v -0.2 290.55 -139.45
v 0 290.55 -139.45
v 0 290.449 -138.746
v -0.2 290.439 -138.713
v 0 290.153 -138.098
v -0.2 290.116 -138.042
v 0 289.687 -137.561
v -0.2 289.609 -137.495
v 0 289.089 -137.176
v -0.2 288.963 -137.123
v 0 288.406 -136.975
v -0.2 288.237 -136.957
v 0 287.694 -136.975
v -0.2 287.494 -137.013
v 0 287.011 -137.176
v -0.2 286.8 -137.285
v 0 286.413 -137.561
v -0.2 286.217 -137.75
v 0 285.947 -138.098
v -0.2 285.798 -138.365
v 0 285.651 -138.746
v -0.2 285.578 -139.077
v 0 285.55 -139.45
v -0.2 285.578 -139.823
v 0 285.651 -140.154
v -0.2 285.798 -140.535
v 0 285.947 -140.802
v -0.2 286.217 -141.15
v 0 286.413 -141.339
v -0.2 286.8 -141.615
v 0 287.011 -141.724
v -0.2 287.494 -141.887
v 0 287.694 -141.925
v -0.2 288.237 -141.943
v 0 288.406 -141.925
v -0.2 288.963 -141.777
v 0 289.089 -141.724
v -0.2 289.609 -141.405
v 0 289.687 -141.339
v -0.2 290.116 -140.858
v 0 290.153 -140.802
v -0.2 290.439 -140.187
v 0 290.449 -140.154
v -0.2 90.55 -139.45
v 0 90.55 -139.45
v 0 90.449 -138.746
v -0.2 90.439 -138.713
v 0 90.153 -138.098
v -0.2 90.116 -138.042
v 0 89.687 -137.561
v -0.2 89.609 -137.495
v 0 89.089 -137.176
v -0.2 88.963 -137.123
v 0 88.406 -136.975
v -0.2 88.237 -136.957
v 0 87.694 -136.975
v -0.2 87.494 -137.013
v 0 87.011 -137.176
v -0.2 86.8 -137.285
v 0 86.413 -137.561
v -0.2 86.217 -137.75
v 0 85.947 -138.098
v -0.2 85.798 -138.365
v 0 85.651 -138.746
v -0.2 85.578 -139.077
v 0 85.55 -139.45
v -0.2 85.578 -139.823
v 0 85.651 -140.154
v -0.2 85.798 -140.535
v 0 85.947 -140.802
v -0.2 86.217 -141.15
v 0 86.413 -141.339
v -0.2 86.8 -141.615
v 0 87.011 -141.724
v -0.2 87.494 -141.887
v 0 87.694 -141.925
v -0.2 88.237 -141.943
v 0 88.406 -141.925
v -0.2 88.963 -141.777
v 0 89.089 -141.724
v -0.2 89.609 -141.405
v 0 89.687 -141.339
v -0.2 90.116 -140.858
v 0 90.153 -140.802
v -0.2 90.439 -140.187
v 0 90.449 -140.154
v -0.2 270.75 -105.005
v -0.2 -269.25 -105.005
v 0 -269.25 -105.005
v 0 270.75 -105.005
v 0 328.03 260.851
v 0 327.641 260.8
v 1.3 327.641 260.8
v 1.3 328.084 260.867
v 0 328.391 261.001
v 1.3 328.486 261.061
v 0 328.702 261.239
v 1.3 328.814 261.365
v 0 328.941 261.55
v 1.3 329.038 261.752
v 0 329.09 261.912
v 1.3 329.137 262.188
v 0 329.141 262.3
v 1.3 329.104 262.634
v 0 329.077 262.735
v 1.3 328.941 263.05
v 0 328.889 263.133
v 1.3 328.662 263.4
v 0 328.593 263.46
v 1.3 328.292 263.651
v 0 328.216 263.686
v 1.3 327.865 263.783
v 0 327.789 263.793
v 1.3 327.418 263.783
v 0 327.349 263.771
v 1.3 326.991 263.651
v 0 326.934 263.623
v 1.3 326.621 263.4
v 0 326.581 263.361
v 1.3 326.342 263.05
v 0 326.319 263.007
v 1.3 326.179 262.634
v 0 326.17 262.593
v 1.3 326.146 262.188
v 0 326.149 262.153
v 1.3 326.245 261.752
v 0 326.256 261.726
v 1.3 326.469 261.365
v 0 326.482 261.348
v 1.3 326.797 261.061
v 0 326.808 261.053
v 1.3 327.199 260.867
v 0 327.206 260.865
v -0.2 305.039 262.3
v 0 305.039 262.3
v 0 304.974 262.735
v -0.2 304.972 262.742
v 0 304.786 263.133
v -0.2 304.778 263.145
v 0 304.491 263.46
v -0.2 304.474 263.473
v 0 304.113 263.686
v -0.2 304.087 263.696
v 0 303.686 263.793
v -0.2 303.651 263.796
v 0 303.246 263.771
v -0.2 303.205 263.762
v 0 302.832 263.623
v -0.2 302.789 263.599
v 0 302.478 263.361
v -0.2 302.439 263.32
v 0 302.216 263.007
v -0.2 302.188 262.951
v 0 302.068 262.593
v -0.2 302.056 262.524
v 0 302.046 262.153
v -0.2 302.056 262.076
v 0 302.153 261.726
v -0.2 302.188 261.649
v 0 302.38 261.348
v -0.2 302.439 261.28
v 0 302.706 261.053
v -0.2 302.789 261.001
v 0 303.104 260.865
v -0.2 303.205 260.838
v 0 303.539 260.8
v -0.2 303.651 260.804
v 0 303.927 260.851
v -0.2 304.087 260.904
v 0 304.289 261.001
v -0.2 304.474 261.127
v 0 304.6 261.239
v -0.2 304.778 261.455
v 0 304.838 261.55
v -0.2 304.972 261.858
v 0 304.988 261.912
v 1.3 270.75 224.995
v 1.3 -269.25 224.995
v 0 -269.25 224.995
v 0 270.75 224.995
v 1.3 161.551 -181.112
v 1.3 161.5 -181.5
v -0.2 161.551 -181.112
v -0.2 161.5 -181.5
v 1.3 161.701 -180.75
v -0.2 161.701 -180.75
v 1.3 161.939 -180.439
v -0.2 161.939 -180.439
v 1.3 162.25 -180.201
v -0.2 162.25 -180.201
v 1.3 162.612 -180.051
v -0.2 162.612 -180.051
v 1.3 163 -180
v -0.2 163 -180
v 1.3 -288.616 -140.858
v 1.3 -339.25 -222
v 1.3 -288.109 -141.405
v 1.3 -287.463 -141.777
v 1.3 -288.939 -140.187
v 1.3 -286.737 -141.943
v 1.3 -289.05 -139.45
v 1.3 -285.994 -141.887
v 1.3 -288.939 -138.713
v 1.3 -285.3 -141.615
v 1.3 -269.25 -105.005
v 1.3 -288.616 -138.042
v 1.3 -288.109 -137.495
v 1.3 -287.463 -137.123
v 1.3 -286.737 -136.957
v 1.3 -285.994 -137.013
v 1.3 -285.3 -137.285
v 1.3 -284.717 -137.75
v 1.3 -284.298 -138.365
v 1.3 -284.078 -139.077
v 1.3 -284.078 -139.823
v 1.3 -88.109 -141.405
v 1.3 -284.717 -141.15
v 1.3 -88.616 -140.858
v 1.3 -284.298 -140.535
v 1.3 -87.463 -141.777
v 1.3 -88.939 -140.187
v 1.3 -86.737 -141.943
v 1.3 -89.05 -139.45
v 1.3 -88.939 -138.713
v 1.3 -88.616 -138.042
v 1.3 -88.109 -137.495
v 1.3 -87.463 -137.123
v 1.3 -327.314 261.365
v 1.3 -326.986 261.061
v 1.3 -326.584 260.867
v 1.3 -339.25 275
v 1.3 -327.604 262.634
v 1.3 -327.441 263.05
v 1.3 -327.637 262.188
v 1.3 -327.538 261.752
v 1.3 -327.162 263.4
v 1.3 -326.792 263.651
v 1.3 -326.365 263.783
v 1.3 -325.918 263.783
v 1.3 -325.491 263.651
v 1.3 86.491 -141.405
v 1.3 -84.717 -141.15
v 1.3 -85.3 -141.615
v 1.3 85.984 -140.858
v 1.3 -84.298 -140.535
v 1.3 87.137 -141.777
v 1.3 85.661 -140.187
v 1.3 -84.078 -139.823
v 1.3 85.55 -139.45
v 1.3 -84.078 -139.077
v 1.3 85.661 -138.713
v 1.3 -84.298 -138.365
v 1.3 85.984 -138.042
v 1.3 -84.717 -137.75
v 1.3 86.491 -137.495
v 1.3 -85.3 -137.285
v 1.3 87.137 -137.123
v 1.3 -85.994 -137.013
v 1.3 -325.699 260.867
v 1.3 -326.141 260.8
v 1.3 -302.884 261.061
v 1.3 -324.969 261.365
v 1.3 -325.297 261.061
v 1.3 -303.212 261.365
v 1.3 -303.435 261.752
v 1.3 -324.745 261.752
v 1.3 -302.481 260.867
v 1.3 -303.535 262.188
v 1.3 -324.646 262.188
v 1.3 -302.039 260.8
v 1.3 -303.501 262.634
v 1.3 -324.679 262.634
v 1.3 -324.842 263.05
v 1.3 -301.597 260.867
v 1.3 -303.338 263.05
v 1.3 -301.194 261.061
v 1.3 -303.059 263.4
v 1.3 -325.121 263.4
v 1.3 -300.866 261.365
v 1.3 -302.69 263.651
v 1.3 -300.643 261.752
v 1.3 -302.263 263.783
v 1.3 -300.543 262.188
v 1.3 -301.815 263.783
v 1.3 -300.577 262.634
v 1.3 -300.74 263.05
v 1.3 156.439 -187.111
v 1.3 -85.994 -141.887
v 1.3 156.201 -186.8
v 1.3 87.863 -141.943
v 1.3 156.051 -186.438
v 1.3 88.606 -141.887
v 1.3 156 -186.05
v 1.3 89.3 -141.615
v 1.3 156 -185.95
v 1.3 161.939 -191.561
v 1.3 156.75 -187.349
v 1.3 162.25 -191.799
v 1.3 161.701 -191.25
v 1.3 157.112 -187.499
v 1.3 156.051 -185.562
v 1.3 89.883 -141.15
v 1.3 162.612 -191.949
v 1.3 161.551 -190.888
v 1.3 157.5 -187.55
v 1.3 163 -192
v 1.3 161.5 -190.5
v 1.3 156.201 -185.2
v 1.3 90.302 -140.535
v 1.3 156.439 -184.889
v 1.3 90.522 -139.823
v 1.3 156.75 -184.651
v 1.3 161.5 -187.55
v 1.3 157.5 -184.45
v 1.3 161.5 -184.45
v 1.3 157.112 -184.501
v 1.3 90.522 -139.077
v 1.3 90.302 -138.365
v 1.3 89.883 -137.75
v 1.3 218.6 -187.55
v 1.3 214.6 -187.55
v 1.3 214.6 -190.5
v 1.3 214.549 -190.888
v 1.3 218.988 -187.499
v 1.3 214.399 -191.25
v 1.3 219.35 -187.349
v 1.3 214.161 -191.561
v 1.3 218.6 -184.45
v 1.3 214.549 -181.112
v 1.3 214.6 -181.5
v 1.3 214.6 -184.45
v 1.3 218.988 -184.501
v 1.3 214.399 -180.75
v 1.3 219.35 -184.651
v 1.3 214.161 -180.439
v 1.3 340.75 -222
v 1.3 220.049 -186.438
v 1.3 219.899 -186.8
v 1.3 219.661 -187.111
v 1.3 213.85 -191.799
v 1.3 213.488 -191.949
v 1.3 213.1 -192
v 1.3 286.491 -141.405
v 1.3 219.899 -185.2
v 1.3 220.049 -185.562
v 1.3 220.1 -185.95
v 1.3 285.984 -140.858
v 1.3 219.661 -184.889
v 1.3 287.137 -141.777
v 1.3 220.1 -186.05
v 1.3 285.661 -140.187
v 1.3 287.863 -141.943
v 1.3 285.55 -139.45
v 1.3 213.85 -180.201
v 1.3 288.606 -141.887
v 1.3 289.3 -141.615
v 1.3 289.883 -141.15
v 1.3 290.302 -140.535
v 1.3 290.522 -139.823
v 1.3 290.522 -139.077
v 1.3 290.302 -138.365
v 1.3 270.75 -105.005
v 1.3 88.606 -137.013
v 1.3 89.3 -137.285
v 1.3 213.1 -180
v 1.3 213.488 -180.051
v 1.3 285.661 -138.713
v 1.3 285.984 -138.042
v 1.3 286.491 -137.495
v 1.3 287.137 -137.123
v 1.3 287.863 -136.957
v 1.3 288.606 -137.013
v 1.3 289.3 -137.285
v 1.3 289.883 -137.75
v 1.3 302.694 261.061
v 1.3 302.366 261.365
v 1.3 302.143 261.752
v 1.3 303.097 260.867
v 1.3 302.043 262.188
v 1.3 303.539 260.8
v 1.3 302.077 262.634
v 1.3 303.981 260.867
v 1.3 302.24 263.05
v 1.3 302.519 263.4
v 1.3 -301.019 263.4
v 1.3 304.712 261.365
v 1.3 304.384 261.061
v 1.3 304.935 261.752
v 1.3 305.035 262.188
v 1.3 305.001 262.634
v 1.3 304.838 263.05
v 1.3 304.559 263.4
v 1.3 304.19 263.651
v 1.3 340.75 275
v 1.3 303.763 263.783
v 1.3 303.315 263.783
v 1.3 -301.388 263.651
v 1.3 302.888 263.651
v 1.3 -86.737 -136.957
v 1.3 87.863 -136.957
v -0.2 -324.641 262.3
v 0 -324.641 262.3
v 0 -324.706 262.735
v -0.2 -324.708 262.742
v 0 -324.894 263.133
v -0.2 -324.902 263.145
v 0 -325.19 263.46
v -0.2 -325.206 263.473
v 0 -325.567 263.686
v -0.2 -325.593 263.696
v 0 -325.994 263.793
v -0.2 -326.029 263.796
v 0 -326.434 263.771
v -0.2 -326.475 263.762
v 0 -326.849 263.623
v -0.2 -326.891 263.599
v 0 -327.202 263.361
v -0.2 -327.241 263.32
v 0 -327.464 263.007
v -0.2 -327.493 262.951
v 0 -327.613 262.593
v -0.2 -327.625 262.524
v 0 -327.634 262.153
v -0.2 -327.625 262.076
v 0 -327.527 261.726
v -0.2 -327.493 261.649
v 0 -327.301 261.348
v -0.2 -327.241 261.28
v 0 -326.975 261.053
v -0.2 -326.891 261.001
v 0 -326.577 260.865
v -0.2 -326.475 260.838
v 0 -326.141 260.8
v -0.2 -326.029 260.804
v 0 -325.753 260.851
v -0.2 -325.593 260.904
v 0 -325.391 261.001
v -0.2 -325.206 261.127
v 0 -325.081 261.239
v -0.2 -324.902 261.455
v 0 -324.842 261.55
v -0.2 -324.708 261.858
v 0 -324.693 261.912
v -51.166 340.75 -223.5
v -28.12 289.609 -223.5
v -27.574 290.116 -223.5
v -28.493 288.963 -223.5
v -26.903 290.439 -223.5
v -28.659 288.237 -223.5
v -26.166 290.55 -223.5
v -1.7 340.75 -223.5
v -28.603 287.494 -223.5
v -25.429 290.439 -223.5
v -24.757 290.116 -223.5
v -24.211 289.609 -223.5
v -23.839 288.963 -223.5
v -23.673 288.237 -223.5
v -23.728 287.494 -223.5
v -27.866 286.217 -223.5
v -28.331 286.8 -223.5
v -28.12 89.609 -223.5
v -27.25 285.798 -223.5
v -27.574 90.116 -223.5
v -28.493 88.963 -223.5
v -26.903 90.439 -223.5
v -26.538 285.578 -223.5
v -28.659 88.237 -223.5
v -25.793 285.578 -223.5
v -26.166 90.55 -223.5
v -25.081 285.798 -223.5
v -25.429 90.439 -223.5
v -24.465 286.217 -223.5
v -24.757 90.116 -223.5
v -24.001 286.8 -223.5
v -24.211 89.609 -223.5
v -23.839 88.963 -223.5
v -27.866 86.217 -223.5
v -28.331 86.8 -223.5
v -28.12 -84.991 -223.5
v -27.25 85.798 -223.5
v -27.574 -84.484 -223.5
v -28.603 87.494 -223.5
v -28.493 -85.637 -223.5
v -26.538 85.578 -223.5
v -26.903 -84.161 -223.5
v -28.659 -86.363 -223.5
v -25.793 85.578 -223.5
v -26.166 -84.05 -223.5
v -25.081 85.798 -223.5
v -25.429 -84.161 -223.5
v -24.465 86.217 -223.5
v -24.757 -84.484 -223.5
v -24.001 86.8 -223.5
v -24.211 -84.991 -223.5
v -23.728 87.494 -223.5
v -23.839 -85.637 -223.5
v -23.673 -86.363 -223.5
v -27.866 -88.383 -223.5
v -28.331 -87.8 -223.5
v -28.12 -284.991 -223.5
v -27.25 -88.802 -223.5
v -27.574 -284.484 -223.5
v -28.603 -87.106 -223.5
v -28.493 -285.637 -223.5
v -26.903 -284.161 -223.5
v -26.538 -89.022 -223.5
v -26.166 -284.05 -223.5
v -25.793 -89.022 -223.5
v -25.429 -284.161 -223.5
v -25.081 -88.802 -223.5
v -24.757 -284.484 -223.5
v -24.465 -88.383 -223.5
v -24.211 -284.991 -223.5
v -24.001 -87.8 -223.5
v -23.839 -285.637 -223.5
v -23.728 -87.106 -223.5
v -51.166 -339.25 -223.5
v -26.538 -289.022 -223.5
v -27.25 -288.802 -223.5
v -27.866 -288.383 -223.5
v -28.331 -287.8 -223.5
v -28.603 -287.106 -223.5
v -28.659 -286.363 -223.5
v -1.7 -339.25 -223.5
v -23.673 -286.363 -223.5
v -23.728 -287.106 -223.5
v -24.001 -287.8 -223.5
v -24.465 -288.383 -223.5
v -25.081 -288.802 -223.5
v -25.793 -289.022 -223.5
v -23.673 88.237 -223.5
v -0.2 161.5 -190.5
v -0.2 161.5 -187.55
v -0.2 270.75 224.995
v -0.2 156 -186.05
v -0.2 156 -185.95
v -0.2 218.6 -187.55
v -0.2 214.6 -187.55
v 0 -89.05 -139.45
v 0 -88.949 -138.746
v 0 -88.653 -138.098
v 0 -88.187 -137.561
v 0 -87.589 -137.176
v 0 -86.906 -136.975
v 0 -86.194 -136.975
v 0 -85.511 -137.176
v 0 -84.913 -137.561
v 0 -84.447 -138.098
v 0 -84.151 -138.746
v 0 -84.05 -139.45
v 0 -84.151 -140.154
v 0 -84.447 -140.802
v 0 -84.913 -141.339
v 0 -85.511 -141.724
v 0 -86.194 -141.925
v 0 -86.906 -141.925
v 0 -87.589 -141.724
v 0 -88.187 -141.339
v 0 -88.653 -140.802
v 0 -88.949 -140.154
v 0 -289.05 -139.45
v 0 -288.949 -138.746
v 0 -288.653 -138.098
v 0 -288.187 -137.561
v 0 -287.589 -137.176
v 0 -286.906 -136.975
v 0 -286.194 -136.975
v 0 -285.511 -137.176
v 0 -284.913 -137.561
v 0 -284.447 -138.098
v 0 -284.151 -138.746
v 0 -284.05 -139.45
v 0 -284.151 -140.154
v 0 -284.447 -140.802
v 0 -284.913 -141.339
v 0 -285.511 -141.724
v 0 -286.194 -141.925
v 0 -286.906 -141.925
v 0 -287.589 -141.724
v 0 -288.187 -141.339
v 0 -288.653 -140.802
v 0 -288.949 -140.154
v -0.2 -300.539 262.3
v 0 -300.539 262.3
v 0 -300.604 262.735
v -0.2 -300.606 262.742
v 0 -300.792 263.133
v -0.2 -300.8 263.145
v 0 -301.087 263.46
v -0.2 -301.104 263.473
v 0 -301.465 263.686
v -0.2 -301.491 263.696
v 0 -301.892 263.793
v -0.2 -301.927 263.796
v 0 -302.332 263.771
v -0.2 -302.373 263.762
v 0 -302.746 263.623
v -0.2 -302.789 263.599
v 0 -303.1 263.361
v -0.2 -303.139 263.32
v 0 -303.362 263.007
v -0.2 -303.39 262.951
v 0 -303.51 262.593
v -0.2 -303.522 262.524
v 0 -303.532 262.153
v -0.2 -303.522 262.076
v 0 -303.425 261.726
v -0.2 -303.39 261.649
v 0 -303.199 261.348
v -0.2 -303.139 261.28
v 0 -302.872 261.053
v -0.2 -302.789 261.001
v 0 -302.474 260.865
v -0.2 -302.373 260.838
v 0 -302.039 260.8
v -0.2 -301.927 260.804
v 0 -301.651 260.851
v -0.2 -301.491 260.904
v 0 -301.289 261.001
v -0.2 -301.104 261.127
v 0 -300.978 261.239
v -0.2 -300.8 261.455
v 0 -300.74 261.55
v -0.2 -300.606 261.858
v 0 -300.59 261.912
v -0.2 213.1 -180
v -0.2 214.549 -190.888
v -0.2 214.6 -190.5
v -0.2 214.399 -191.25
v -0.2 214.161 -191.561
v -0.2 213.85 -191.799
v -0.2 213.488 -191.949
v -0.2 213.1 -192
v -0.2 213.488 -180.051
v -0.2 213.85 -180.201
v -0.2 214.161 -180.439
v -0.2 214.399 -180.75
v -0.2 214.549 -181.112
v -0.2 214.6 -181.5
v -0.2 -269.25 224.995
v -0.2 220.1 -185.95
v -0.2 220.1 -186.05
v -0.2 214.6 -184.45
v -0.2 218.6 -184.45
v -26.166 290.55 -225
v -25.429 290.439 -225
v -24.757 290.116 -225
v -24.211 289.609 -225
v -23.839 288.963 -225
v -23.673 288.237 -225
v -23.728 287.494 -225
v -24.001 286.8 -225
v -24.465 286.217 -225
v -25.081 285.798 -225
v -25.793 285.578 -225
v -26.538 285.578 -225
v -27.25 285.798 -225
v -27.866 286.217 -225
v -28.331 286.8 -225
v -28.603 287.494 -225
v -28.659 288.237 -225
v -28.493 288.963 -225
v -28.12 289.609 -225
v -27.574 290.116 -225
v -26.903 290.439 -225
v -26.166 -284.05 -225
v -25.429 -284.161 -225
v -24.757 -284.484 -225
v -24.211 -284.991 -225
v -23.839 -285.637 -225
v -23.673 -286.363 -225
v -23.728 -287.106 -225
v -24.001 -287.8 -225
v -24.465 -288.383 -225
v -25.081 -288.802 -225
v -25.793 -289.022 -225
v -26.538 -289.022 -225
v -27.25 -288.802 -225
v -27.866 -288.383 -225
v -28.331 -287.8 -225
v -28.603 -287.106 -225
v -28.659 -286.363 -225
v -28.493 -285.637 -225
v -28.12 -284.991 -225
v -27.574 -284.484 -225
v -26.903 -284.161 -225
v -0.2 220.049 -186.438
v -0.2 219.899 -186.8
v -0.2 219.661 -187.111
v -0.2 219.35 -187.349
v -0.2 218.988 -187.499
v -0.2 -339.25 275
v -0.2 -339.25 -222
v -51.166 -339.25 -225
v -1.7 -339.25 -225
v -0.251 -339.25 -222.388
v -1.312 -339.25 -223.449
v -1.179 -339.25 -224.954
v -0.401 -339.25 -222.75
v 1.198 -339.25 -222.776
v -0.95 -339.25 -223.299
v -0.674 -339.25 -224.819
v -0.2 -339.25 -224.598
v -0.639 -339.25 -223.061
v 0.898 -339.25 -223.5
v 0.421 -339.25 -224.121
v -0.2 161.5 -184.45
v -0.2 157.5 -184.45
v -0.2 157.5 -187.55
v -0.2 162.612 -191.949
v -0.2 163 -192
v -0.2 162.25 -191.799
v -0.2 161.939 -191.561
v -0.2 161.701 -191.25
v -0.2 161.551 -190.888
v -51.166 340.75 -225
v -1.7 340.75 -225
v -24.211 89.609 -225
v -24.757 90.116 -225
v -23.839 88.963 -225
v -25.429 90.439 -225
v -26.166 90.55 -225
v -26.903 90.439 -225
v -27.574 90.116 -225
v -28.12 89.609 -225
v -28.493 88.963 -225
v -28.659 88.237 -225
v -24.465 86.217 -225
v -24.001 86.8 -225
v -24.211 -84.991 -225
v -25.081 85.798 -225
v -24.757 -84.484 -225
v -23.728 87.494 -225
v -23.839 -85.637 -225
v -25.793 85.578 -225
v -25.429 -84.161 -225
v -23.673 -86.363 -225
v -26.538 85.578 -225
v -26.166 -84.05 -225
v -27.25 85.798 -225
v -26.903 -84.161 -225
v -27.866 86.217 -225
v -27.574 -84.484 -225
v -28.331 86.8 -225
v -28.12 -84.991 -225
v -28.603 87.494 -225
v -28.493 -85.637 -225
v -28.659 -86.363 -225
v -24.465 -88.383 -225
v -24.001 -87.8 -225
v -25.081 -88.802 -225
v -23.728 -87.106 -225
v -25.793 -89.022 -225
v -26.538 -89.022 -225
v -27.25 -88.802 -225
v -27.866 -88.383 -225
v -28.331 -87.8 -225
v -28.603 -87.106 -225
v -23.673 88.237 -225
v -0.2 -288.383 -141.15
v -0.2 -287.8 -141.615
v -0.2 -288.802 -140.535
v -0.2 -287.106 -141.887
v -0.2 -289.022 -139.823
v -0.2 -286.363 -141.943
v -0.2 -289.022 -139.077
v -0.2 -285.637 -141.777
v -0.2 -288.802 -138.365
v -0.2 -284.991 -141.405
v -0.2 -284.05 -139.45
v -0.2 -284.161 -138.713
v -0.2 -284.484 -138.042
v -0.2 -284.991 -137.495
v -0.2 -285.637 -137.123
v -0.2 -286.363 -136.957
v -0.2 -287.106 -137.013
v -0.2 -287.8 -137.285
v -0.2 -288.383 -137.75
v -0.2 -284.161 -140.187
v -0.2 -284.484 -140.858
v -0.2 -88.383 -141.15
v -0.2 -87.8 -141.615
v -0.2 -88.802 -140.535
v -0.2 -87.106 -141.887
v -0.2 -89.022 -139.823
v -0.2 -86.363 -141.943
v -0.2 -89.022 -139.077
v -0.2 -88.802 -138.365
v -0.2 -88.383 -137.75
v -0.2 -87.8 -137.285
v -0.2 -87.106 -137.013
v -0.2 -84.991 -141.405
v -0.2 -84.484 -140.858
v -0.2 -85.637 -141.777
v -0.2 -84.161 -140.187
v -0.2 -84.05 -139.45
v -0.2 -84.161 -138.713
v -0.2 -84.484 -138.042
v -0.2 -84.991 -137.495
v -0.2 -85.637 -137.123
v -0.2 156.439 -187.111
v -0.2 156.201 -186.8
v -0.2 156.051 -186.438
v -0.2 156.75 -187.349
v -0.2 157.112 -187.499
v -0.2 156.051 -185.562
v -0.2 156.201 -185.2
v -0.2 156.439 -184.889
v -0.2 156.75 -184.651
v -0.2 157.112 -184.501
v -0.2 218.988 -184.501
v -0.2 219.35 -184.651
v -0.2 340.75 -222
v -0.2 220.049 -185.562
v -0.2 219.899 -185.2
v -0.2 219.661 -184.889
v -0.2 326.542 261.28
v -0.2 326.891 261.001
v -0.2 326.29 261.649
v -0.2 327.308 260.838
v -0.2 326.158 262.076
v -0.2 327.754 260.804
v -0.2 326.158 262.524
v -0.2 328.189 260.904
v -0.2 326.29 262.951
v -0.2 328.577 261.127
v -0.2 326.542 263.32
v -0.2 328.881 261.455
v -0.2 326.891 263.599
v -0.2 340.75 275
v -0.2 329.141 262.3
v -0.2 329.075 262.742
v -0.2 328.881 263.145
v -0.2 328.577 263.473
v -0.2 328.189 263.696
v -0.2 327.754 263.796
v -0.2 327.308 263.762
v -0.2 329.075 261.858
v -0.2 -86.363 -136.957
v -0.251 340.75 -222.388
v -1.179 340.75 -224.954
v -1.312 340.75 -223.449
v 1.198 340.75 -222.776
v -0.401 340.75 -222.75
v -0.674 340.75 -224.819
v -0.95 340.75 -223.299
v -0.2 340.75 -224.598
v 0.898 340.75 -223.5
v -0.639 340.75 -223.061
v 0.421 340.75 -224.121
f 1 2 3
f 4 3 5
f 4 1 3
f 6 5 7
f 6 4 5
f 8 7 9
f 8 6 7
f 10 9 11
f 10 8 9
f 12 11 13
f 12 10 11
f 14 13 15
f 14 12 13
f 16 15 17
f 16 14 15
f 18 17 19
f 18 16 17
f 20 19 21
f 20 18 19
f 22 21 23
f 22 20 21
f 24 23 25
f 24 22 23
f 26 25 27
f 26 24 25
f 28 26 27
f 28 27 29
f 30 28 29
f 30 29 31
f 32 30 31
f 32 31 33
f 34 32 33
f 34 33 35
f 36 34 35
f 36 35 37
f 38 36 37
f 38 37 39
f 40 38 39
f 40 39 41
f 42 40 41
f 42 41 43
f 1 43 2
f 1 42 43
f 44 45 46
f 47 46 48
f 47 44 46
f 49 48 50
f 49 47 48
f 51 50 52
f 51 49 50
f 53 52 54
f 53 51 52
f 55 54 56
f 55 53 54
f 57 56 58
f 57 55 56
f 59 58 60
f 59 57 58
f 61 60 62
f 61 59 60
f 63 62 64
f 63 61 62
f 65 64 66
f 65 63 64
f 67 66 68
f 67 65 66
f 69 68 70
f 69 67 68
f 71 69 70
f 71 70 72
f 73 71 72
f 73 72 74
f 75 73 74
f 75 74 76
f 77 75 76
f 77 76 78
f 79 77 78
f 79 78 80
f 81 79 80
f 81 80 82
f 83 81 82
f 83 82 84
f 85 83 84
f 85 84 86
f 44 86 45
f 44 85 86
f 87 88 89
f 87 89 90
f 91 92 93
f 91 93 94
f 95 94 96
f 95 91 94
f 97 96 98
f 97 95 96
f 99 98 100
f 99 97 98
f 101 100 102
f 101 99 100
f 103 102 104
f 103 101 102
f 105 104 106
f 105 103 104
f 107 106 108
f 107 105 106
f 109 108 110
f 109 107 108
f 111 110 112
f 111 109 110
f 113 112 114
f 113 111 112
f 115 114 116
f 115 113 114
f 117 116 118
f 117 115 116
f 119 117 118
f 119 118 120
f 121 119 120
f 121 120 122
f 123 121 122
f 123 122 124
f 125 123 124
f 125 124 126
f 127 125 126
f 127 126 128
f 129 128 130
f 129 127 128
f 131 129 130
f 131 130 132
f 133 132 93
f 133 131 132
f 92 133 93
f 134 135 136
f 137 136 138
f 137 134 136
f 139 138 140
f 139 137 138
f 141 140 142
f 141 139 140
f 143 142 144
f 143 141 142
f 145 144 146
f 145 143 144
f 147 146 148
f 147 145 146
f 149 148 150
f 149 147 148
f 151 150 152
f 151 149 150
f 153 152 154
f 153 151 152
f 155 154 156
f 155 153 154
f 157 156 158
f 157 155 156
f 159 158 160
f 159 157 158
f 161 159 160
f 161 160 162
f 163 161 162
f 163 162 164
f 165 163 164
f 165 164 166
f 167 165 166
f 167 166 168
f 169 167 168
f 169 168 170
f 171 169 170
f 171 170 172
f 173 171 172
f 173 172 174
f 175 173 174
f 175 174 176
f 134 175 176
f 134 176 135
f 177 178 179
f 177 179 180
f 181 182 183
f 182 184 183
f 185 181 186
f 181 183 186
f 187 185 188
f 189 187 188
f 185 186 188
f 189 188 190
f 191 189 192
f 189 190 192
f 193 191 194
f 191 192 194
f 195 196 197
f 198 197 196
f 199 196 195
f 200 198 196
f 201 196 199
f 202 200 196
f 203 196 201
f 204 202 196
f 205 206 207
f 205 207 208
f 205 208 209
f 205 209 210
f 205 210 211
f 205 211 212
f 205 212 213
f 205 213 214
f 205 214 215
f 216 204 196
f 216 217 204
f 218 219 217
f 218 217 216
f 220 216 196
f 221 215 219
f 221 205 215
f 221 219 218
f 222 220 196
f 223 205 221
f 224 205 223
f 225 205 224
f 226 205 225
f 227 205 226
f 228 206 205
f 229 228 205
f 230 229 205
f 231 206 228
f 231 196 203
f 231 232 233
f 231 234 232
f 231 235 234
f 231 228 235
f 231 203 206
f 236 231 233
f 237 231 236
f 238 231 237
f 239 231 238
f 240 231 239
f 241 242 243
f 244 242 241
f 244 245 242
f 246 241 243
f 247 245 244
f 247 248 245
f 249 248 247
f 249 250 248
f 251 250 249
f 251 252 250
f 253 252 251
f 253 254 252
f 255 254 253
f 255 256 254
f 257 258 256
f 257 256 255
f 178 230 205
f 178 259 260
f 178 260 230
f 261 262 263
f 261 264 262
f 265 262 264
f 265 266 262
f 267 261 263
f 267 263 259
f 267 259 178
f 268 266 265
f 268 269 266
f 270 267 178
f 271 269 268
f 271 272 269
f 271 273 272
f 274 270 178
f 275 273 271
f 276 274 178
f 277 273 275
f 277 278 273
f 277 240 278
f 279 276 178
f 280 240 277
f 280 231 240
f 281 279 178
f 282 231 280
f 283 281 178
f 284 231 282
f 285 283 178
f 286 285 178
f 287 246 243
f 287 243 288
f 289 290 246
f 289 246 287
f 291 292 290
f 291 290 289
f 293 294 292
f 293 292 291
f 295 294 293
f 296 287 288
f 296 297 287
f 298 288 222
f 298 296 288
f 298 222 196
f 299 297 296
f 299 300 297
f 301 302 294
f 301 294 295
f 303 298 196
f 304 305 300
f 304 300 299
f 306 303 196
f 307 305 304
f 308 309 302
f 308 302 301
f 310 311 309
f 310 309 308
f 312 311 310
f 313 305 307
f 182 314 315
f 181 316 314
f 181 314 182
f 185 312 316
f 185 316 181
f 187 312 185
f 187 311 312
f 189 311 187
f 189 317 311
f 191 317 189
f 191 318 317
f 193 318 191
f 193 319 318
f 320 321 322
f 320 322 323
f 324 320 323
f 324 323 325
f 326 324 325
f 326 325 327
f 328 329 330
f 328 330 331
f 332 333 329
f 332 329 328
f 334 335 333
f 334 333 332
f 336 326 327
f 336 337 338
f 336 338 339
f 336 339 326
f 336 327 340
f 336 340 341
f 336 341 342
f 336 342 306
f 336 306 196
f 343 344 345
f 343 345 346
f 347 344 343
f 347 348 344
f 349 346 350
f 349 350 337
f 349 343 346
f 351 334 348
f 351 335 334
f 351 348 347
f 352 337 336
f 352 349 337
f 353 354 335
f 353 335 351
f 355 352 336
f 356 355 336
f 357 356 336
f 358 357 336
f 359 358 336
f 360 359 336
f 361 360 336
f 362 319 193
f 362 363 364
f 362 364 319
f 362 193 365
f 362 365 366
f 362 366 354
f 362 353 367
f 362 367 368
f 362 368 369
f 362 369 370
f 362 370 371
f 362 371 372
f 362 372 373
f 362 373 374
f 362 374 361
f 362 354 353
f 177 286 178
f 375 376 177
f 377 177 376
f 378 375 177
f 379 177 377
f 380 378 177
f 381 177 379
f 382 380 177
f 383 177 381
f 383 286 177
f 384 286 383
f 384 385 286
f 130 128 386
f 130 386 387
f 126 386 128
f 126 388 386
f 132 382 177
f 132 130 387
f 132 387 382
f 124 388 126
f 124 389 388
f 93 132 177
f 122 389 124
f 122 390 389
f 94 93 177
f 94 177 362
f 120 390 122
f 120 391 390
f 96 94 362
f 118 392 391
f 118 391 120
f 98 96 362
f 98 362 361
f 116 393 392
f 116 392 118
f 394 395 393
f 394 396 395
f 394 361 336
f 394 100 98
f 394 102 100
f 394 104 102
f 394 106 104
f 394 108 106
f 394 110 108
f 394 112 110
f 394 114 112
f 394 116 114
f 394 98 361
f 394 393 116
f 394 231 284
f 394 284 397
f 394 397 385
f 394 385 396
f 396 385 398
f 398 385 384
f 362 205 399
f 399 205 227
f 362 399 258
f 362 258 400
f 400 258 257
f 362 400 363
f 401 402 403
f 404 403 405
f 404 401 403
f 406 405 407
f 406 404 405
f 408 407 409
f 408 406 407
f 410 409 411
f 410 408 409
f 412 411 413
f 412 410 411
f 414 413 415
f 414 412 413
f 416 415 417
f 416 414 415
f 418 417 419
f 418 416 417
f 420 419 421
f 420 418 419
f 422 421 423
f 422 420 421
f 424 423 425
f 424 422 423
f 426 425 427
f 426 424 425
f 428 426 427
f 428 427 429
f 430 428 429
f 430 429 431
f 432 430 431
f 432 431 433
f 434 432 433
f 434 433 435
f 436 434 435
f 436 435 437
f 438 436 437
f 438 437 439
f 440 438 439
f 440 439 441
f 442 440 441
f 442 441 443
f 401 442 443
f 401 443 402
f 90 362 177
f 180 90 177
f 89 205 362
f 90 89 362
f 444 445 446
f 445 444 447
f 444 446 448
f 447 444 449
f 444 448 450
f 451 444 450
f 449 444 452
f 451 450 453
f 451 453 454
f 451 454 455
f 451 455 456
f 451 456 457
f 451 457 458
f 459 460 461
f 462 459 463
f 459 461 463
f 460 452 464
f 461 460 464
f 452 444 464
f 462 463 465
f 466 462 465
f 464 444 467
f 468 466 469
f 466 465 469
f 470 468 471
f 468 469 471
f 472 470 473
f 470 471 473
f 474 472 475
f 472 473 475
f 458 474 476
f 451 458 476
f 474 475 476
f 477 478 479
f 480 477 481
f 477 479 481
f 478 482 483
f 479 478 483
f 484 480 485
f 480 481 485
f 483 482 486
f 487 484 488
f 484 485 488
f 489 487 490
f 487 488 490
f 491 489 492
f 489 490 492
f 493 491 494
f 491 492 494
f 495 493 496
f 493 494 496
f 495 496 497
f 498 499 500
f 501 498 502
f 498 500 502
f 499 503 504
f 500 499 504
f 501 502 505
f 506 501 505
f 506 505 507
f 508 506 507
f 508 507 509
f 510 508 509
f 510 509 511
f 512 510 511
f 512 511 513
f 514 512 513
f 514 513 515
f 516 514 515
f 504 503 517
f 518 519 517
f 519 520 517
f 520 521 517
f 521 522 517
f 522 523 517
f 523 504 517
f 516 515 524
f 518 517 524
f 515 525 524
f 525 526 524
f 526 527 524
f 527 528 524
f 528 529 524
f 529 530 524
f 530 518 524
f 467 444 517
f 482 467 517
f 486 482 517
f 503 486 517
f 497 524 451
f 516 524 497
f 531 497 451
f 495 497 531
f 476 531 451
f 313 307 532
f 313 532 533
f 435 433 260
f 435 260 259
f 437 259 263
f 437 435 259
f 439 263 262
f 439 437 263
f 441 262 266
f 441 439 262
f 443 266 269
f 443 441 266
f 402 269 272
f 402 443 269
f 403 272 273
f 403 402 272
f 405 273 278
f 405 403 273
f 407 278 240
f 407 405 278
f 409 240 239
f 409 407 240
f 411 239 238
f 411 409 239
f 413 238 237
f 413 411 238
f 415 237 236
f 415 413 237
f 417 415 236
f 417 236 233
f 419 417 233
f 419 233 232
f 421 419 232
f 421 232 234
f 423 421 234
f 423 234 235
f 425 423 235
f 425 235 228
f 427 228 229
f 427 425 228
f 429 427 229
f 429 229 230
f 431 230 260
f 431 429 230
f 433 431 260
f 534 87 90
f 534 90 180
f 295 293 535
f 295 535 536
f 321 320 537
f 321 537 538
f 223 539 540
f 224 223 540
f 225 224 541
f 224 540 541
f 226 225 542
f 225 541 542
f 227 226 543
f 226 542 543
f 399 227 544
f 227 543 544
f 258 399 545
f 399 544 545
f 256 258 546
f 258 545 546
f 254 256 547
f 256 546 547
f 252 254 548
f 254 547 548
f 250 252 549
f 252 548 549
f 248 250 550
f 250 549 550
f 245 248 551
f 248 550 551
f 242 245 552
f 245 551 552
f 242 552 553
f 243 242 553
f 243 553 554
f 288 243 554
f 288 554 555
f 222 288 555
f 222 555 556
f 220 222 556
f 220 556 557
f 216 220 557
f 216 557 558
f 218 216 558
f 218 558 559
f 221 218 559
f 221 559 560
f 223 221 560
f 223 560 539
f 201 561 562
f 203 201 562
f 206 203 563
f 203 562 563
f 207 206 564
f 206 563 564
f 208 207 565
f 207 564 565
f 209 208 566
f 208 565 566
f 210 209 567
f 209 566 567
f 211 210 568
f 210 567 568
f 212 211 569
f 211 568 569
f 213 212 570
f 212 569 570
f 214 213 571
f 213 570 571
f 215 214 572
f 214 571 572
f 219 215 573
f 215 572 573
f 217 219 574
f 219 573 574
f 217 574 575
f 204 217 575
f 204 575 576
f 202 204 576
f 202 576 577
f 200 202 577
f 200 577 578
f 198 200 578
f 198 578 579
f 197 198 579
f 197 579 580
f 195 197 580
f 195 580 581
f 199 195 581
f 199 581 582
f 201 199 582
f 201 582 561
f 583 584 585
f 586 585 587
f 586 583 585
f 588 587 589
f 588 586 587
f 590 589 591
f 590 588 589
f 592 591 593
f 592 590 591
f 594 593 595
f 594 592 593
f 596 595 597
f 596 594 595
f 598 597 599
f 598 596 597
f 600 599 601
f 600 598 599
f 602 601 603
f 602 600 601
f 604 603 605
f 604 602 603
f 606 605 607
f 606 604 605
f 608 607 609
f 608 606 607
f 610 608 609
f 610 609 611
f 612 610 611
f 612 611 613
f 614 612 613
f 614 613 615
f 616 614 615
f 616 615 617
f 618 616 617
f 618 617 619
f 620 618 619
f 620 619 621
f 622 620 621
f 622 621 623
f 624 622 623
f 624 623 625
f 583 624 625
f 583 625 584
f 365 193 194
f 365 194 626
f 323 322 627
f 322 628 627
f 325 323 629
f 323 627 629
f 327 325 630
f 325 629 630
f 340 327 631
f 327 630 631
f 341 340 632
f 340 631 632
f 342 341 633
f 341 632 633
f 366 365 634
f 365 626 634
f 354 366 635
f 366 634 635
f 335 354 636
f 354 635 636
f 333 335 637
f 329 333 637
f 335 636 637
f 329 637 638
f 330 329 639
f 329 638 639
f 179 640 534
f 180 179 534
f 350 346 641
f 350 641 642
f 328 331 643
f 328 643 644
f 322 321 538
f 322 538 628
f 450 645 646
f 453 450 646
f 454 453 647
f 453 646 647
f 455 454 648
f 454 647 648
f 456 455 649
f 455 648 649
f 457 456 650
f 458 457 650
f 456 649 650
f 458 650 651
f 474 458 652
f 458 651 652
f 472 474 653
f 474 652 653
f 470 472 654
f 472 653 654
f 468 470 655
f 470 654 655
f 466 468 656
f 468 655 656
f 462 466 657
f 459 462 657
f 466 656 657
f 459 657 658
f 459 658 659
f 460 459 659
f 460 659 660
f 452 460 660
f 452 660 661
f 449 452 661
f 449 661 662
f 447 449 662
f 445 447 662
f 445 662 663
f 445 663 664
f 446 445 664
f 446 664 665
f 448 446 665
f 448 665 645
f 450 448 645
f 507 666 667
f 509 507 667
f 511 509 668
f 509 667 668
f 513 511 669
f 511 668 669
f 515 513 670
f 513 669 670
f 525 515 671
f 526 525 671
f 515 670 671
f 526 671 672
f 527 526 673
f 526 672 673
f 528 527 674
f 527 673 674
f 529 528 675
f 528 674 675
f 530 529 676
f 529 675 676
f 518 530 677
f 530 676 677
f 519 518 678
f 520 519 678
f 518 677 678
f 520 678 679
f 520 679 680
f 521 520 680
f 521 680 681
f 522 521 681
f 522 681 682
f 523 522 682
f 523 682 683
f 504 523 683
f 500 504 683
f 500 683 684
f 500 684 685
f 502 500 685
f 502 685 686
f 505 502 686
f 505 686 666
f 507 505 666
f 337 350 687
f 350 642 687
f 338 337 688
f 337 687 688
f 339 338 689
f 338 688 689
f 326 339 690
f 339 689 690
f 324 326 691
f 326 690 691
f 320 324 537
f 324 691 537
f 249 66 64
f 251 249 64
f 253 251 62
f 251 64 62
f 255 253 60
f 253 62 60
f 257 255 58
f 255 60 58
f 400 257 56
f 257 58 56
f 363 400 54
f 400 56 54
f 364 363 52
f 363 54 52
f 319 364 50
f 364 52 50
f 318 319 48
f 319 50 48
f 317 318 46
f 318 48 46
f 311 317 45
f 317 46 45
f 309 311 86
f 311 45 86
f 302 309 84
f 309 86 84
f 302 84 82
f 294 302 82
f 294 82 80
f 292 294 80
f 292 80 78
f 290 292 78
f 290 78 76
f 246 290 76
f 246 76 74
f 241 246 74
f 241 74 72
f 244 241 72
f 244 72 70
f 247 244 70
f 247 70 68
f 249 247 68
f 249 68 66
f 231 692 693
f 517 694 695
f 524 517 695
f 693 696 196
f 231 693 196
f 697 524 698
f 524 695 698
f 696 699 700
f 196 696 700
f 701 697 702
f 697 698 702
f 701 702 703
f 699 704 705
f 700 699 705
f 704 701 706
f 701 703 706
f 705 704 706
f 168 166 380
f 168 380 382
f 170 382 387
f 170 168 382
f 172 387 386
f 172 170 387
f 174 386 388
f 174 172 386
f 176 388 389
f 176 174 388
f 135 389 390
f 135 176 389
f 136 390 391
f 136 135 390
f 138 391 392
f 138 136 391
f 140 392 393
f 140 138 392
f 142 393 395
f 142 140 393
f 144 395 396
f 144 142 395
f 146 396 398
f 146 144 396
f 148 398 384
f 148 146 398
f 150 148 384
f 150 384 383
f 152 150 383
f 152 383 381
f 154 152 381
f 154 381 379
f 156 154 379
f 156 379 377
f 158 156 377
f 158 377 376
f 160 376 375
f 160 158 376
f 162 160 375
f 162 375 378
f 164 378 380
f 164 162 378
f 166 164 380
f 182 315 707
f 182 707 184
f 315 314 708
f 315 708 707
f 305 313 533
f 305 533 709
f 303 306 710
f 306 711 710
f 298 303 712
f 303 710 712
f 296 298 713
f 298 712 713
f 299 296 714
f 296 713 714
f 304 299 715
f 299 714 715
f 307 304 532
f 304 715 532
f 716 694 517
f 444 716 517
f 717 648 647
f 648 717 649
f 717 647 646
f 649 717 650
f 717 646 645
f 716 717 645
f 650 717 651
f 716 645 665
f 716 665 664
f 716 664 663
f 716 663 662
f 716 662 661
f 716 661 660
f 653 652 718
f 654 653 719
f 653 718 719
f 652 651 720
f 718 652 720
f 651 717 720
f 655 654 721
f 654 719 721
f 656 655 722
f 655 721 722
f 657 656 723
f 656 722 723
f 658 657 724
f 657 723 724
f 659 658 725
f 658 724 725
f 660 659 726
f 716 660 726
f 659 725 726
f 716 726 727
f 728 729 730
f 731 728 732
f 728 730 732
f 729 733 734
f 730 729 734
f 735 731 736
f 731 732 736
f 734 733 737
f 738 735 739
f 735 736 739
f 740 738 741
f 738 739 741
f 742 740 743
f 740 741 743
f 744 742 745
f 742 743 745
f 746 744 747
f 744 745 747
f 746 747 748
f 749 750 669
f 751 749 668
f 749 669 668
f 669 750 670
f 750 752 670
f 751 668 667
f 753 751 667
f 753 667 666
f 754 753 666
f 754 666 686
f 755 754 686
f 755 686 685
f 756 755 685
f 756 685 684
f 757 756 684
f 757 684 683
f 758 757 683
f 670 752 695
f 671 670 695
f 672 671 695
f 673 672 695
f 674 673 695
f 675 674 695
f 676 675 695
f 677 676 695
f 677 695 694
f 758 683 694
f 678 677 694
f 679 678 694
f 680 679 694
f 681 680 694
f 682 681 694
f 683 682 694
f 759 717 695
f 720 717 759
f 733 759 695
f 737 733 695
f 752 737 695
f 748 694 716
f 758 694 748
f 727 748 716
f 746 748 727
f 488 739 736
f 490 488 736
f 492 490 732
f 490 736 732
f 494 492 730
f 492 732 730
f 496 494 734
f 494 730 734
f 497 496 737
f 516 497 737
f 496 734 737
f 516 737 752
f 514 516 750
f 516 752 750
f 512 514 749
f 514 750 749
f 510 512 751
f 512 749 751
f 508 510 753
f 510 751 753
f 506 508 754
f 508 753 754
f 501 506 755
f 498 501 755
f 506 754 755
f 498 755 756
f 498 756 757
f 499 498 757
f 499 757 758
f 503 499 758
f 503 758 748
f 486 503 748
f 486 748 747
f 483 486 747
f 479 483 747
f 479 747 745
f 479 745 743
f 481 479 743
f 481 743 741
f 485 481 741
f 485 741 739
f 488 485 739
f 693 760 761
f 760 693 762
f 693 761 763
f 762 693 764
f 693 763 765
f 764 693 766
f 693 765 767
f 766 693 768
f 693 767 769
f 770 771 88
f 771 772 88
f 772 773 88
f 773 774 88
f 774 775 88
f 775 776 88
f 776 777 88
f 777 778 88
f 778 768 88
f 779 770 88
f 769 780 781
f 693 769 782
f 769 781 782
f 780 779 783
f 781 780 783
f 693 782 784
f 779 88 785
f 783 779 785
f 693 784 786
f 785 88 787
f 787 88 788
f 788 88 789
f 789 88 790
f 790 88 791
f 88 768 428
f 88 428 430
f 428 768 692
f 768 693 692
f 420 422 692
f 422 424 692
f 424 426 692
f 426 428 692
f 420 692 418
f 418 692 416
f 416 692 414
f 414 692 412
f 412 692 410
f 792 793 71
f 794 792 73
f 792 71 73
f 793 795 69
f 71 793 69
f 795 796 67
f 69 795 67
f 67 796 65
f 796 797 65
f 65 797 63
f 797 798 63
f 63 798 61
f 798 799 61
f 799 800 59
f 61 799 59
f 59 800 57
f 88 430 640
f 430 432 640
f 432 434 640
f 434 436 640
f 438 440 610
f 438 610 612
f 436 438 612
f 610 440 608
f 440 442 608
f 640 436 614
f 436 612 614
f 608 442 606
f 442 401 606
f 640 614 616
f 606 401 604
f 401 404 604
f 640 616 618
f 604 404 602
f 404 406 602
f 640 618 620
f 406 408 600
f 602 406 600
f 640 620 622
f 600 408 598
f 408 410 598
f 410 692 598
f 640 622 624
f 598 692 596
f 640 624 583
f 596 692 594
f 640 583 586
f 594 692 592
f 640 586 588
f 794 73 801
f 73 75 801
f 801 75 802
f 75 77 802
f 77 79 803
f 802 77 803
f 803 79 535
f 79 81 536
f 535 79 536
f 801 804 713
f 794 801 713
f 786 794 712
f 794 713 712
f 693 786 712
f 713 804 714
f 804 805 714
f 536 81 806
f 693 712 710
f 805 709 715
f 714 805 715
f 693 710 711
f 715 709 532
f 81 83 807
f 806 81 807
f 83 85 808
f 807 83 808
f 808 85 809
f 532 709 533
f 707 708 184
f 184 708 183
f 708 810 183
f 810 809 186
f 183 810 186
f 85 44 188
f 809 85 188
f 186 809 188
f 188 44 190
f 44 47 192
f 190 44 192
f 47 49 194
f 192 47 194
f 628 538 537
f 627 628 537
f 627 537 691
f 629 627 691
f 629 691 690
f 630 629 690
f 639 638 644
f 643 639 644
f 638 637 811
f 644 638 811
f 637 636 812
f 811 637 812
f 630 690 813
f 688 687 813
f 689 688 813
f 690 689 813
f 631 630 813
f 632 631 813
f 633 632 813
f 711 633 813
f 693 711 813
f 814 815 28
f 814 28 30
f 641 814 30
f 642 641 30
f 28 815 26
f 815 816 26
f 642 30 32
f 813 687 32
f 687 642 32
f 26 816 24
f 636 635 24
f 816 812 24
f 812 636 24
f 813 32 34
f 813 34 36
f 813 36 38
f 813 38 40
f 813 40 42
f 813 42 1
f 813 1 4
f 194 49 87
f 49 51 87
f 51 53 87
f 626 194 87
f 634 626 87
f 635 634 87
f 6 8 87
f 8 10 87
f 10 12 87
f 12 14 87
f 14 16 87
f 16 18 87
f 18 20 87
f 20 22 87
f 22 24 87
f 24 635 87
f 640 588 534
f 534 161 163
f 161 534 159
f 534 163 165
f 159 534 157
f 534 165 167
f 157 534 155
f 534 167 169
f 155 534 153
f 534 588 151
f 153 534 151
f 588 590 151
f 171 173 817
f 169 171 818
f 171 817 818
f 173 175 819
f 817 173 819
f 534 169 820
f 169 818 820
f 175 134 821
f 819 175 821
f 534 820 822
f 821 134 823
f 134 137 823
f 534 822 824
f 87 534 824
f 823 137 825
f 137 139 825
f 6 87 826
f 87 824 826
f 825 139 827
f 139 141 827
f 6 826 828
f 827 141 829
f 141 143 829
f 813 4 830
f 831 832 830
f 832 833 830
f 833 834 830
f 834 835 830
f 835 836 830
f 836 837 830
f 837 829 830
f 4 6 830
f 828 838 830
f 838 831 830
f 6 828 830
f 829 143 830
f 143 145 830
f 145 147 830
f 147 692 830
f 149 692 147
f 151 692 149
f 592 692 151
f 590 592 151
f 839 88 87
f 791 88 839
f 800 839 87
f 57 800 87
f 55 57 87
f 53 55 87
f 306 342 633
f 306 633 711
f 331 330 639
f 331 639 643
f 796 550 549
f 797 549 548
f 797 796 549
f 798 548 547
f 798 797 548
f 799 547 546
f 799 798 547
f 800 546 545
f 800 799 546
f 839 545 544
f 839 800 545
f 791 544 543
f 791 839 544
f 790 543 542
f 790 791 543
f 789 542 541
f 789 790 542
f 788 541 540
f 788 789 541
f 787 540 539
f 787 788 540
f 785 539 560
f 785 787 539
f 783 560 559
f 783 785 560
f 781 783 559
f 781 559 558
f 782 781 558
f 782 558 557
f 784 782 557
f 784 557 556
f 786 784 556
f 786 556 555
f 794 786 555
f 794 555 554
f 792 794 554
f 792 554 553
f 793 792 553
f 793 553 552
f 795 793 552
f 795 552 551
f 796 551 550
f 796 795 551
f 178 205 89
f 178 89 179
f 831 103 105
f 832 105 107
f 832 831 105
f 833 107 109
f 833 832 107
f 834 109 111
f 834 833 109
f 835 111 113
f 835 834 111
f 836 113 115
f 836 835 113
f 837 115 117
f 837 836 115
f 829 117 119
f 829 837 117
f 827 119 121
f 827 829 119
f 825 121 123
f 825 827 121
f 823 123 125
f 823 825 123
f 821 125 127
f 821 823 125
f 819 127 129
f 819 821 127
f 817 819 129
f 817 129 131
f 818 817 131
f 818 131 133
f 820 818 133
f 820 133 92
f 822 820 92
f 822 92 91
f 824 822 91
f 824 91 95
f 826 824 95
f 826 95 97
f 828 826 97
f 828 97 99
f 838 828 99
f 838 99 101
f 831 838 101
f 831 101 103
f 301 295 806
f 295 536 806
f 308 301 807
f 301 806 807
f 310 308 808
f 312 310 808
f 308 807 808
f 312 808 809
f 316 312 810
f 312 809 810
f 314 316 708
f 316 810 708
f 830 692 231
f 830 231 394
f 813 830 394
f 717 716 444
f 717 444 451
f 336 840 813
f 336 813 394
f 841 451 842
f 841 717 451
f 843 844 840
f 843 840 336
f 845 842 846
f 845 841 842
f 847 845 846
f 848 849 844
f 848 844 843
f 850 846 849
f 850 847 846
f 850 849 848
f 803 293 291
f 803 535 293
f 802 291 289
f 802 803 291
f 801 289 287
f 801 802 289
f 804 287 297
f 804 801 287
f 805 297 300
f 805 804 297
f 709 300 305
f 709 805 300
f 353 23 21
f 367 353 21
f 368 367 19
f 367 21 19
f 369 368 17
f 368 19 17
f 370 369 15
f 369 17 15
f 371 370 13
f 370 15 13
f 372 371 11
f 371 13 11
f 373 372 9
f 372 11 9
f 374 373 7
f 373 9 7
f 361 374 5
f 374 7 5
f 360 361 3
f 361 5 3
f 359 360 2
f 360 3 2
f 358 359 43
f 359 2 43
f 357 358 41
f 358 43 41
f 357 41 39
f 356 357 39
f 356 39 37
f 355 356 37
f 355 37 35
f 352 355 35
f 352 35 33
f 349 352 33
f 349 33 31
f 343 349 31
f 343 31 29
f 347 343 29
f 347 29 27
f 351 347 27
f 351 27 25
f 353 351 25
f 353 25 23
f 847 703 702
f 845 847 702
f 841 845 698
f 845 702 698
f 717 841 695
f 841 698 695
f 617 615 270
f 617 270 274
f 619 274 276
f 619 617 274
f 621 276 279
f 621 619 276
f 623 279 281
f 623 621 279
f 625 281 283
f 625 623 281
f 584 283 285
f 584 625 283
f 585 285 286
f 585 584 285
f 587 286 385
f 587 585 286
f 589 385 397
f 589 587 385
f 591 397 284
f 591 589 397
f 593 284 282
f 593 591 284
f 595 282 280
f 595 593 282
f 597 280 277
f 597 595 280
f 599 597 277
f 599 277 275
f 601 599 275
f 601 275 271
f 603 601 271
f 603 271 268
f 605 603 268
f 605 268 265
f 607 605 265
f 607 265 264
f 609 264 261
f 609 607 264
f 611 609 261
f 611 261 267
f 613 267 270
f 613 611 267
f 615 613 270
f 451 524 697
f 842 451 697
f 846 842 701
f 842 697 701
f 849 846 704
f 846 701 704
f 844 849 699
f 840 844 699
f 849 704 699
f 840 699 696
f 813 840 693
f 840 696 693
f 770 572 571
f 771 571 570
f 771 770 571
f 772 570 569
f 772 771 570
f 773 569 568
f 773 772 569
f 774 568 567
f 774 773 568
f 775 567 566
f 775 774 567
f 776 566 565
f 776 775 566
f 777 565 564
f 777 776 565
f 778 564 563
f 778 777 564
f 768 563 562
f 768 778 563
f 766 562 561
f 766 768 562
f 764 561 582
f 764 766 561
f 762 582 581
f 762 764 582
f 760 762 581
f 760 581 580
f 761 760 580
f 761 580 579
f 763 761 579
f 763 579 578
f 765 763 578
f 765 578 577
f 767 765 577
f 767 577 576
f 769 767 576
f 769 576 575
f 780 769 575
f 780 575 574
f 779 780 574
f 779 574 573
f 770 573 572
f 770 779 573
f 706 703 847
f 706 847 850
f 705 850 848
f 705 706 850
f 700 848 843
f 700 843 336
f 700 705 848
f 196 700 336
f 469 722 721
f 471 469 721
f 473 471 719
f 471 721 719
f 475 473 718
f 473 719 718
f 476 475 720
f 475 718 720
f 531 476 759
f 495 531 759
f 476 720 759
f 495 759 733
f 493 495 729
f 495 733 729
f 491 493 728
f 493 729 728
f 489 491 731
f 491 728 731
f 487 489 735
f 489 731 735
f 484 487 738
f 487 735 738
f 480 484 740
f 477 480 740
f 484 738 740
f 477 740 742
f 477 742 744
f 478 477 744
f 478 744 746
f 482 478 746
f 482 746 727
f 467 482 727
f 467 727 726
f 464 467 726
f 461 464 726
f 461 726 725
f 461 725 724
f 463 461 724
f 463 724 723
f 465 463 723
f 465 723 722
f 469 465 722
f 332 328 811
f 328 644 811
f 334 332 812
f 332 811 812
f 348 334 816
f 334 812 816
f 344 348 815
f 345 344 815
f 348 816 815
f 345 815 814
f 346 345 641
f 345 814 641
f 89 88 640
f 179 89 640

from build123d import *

# Parameters (mm, degrees)
SKETCH1_W                  = 680
SKETCH1_H                  = 550
SKETCH1_R                  = 1.5
BOSS_EXTRUDE1_DEPTH        = 1.3
SKETCH3_W                  = 540
SKETCH3_H                  = 330
CUT_EXTRUDE1_DEPTH         = 438.878125167
F_5_0_5_DIAMETER_HOLE1_D   = 5
CONVERT_SOLID1_START       = -0.2
CONVERT_SOLID1_OUTLINE_W   = 680
CONVERT_SOLID1_OUTLINE_H   = 550
CONVERT_SOLID1_OUTLINE_R   = 2.5
CONVERT_SOLID1_OUTLINE_R_2 = 1.5
CONVERT_SOLID1_OUTLINE_W_2 = 540
CONVERT_SOLID1_OUTLINE_H_2 = 330
CONVERT_SOLID1_DEPTH       = 0.2
SKETCHED_START             = -339.25
SKETCHED_BEND1_DEPTH       = 680
SKETCHED_BEND1_2_DEPTH     = 680
F_5_0_5_DIAMETER_HOLE2_D   = 5
CUT_EXTRUDE2_DEPTH         = 442.008177978
FILLET4_R                  = 1.5
FILLET5_R                  = 1.5
FILLET6_R                  = 1.5
FILLET7_R                  = 1.5
FILLET8_R                  = 1.5
FILLET9_R                  = 1.5
FILLET10_R                 = 1.5
FILLET11_R                 = 1.5


# Read off the part's stored shape, not the designer's step: Convert-Solid1, Sketched Bend1
with BuildPart() as part:
    # Sketch1 → Boss-Extrude1 (new body)
    with BuildSketch(Plane.YZ):
        with Locations((0.75, 0)):
            Rectangle(SKETCH1_W, SKETCH1_H)
        with Locations(Location((-326.141480577, 262.3, 0), (0, 0, 270))):
            Circle(SKETCH1_R, mode=Mode.SUBTRACT)
        with Locations(Location((-302.039034574, 262.3, 0), (0, 0, 270))):
            Circle(SKETCH1_R, mode=Mode.SUBTRACT)
        with Locations(Location((327.641480577, 262.3, 0), (0, 0, 270))):
            Circle(SKETCH1_R, mode=Mode.SUBTRACT)
        with Locations(Location((303.539034574, 262.3, 0), (0, 0, 270))):
            Circle(SKETCH1_R, mode=Mode.SUBTRACT)
    extrude(amount=BOSS_EXTRUDE1_DEPTH)

    # Sketch3 → Cut-Extrude1 (cut, through all)
    with BuildSketch(Plane.YZ.offset(1.3)):
        with Locations((0.75, 59.995312317)):
            Rectangle(SKETCH3_W, SKETCH3_H)
    extrude(amount=-CUT_EXTRUDE1_DEPTH, mode=Mode.SUBTRACT)

    # Ø5.0 (5) Diameter Hole1 (through all)
    with Locations(Plane.YZ.offset(1.3)):
        with Locations((288.05, -139.45), (-286.55, -139.45), (-86.55, -139.45), (88.05, -139.45)):
            Hole(F_5_0_5_DIAMETER_HOLE1_D / 2)

    # Convert-Solid1 outline → Convert-Solid1 (add)
    with BuildSketch(Plane.YZ.offset(CONVERT_SOLID1_START)):
        with Locations((0.75, 0)):
            Rectangle(CONVERT_SOLID1_OUTLINE_W, CONVERT_SOLID1_OUTLINE_H)
        with Locations((-286.55, -139.45)):
            Circle(CONVERT_SOLID1_OUTLINE_R, mode=Mode.SUBTRACT)
        with Locations((-86.55, -139.45)):
            Circle(CONVERT_SOLID1_OUTLINE_R, mode=Mode.SUBTRACT)
        with Locations((88.05, -139.45)):
            Circle(CONVERT_SOLID1_OUTLINE_R, mode=Mode.SUBTRACT)
        with Locations((288.05, -139.45)):
            Circle(CONVERT_SOLID1_OUTLINE_R, mode=Mode.SUBTRACT)
        with Locations((-326.141480577, 262.3)):
            Circle(CONVERT_SOLID1_OUTLINE_R_2, mode=Mode.SUBTRACT)
        with Locations((-302.039034574, 262.3)):
            Circle(CONVERT_SOLID1_OUTLINE_R_2, mode=Mode.SUBTRACT)
        with Locations((0.75, 59.995312317)):
            Rectangle(CONVERT_SOLID1_OUTLINE_W_2, CONVERT_SOLID1_OUTLINE_H_2, mode=Mode.SUBTRACT)
        with Locations((303.539034574, 262.3)):
            Circle(CONVERT_SOLID1_OUTLINE_R_2, mode=Mode.SUBTRACT)
        with Locations((327.641480577, 262.3)):
            Circle(CONVERT_SOLID1_OUTLINE_R_2, mode=Mode.SUBTRACT)
    extrude(amount=CONVERT_SOLID1_DEPTH)

    # Sketched Bend1 outline → Sketched Bend1 (cut)
    with BuildSketch(Plane(origin=(0, 0, 0), x_dir=(1, 0, 0), z_dir=(0, 1, 0)).offset(SKETCHED_START)):
        with BuildLine():
            Line((-0.2, 275), (-0.2, 224.598076212))
            ThreePointArc((-0.2, 224.598076212), (0.898076212, 223.5), (1.3, 222))
            Line((1.3, 222), (1.3, 275))
            Line((1.3, 275), (-0.2, 275))
        make_face()
    extrude(amount=SKETCHED_BEND1_DEPTH, mode=Mode.SUBTRACT)

    # Sketched Bend1 2 outline → Sketched Bend1 2 (add)
    with BuildSketch(Plane(origin=(0, 0, 0), x_dir=(1, 0, 0), z_dir=(0, 1, 0)).offset(SKETCHED_START)):
        with BuildLine():
            Line((-51.165708265, 225), (-51.165708265, 223.5))
            Line((-51.165708265, 223.5), (-1.7, 223.5))
            ThreePointArc((-1.7, 223.5), (-0.639339828, 223.060660172), (-0.2, 222))
            Line((-0.2, 222), (-0.2, 224.598076212))
            ThreePointArc((-0.2, 224.598076212), (-0.923542865, 224.897777479), (-1.7, 225))
            Line((-1.7, 225), (-51.165708265, 225))
        make_face()
    extrude(amount=SKETCHED_BEND1_2_DEPTH)

    # Ø5.0 (5) Diameter Hole2 (through all)
    with Locations(Plane(origin=(0, 0, -223.5), x_dir=(0, -1, 0), z_dir=(0, 0, 1))):
        with Locations((-288.05, -26.165708265), (-88.05, -26.165708265), (86.55, -26.165708265), (286.55, -26.165708265)):
            Hole(F_5_0_5_DIAMETER_HOLE2_D / 2)

    # Sketch15 → Cut-Extrude2 (cut, through all)
    with BuildSketch(Plane.YZ.offset(1.3)):
        Polygon((161.5, -180), (214.6, -180), (214.6, -184.45), (220.1, -184.45), (220.1, -187.55), (214.6, -187.55), (214.6, -192), (161.5, -192), (161.5, -187.55), (156, -187.55), (156, -184.45), (161.5, -184.45), align=None)
    extrude(amount=-CUT_EXTRUDE2_DEPTH, mode=Mode.SUBTRACT)

    # Fillet4
    fillet4_edges = [part.edges().sort_by_distance(p)[0] for p in [
        (0.55, 161.5, -180),
    ]]
    fillet(fillet4_edges, radius=FILLET4_R)

    # Fillet5
    fillet5_edges = [part.edges().sort_by_distance(p)[0] for p in [
        (0.55, 214.6, -180),
    ]]
    fillet(fillet5_edges, radius=FILLET5_R)

    # Fillet6
    fillet6_edges = [part.edges().sort_by_distance(p)[0] for p in [
        (0.55, 220.1, -184.45),
    ]]
    fillet(fillet6_edges, radius=FILLET6_R)

    # Fillet7
    fillet7_edges = [part.edges().sort_by_distance(p)[0] for p in [
        (0.55, 220.1, -187.55),
    ]]
    fillet(fillet7_edges, radius=FILLET7_R)

    # Fillet8
    fillet8_edges = [part.edges().sort_by_distance(p)[0] for p in [
        (0.55, 214.6, -192),
    ]]
    fillet(fillet8_edges, radius=FILLET8_R)

    # Fillet9
    fillet9_edges = [part.edges().sort_by_distance(p)[0] for p in [
        (0.55, 161.5, -192),
    ]]
    fillet(fillet9_edges, radius=FILLET9_R)

    # Fillet10
    fillet10_edges = [part.edges().sort_by_distance(p)[0] for p in [
        (0.55, 156, -184.45),
    ]]
    fillet(fillet10_edges, radius=FILLET10_R)

    # Fillet11
    fillet11_edges = [part.edges().sort_by_distance(p)[0] for p in [
        (0.55, 156, -187.55),
    ]]
    fillet(fillet11_edges, radius=FILLET11_R)


solid = part.part
